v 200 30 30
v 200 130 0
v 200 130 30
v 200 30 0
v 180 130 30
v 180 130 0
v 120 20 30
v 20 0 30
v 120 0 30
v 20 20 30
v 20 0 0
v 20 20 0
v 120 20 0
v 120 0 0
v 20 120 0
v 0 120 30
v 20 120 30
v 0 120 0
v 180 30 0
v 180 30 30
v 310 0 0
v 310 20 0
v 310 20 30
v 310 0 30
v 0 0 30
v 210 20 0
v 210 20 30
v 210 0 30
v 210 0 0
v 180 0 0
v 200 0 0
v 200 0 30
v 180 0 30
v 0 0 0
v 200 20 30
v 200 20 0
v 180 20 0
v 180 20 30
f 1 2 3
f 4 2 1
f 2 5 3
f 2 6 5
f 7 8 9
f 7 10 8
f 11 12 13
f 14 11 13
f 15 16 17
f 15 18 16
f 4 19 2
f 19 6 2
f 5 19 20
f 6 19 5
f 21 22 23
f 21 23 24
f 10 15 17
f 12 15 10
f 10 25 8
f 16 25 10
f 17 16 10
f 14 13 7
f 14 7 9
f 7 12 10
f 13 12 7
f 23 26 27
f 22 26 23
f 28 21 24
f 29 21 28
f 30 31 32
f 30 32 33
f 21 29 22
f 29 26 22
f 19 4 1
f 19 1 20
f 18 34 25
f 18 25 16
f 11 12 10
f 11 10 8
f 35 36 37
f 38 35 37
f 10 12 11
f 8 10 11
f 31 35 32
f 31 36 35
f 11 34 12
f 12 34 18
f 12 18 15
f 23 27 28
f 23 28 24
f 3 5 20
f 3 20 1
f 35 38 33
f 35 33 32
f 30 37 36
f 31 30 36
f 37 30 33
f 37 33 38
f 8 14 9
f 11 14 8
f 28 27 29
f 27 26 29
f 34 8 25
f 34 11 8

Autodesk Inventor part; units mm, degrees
ref_plane "YZ Plane" through (0, 0, 0) normal (1, 0, 0) x (0, 1, 0)
ref_plane "XZ Plane" through (0, 0, 0) normal (0, 1, 0) x (-1, 0, 0)
ref_plane "XY Plane" through (0, 0, 0) normal (0, 0, 1) x (1, 0, 0)
sketch "Sketch1" plane through (0, 0, 0) normal (0, 0, 1) x (1, 0, 0)
  line L0 (0, 120) -> (20, 120)
  line L1 (20, 120) -> (20, 0)
  line L2 (20, 0) -> (0, 0)
  line L3 (0, 0) -> (0, 120)
  line L4 (120, 0) -> (20, 0)
  line L5 (20, 0) -> (20, 20)
  line L6 (20, 20) -> (120, 20)
  line L7 (120, 20) -> (120, 0)
  line L8 (180, 120) -> (200, 120)
  line L9 (200, 120) -> (200, 20)
  line L10 (200, 20) -> (180, 20)
  line L11 (180, 20) -> (180, 120)
  line L12 (180, 20) -> (200, 20)
  line L13 (200, 20) -> (200, 0)
  line L14 (200, 0) -> (180, 0)
  line L15 (180, 0) -> (180, 20)
  line L16 (200, 20) -> (300, 20)
  line L17 (300, 20) -> (300, 0)
  line L18 (300, 0) -> (200, 0)
  line L19 (200, 0) -> (200, 20)
extrude "Extrusion1" add sketch "Sketch1" along normal blind 30 contours L0 L1 L2 L3
extrude "Extrusion2" add sketch "Sketch1" along normal blind 30 separate body contours L6 L7 L4 L1
extrude "Extrusion3" add sketch "Sketch1" along normal blind 30 separate body contours L8 L9 L10 L11
extrude "Extrusion4" add sketch "Sketch1" along normal blind 30 separate body contours L10 L13 L14 L15
extrude "Extrusion5" add sketch "Sketch1" along normal blind 30 separate body contours L16 L17 L18 L13
move or copy body "Move Body1" bodies to move or copy 3 copy no translate (0, 10, 0)
move or copy body "Move Body2" bodies to move or copy 5 copy no translate (10, 0, 0)
properties part number "CellDecompExample"
